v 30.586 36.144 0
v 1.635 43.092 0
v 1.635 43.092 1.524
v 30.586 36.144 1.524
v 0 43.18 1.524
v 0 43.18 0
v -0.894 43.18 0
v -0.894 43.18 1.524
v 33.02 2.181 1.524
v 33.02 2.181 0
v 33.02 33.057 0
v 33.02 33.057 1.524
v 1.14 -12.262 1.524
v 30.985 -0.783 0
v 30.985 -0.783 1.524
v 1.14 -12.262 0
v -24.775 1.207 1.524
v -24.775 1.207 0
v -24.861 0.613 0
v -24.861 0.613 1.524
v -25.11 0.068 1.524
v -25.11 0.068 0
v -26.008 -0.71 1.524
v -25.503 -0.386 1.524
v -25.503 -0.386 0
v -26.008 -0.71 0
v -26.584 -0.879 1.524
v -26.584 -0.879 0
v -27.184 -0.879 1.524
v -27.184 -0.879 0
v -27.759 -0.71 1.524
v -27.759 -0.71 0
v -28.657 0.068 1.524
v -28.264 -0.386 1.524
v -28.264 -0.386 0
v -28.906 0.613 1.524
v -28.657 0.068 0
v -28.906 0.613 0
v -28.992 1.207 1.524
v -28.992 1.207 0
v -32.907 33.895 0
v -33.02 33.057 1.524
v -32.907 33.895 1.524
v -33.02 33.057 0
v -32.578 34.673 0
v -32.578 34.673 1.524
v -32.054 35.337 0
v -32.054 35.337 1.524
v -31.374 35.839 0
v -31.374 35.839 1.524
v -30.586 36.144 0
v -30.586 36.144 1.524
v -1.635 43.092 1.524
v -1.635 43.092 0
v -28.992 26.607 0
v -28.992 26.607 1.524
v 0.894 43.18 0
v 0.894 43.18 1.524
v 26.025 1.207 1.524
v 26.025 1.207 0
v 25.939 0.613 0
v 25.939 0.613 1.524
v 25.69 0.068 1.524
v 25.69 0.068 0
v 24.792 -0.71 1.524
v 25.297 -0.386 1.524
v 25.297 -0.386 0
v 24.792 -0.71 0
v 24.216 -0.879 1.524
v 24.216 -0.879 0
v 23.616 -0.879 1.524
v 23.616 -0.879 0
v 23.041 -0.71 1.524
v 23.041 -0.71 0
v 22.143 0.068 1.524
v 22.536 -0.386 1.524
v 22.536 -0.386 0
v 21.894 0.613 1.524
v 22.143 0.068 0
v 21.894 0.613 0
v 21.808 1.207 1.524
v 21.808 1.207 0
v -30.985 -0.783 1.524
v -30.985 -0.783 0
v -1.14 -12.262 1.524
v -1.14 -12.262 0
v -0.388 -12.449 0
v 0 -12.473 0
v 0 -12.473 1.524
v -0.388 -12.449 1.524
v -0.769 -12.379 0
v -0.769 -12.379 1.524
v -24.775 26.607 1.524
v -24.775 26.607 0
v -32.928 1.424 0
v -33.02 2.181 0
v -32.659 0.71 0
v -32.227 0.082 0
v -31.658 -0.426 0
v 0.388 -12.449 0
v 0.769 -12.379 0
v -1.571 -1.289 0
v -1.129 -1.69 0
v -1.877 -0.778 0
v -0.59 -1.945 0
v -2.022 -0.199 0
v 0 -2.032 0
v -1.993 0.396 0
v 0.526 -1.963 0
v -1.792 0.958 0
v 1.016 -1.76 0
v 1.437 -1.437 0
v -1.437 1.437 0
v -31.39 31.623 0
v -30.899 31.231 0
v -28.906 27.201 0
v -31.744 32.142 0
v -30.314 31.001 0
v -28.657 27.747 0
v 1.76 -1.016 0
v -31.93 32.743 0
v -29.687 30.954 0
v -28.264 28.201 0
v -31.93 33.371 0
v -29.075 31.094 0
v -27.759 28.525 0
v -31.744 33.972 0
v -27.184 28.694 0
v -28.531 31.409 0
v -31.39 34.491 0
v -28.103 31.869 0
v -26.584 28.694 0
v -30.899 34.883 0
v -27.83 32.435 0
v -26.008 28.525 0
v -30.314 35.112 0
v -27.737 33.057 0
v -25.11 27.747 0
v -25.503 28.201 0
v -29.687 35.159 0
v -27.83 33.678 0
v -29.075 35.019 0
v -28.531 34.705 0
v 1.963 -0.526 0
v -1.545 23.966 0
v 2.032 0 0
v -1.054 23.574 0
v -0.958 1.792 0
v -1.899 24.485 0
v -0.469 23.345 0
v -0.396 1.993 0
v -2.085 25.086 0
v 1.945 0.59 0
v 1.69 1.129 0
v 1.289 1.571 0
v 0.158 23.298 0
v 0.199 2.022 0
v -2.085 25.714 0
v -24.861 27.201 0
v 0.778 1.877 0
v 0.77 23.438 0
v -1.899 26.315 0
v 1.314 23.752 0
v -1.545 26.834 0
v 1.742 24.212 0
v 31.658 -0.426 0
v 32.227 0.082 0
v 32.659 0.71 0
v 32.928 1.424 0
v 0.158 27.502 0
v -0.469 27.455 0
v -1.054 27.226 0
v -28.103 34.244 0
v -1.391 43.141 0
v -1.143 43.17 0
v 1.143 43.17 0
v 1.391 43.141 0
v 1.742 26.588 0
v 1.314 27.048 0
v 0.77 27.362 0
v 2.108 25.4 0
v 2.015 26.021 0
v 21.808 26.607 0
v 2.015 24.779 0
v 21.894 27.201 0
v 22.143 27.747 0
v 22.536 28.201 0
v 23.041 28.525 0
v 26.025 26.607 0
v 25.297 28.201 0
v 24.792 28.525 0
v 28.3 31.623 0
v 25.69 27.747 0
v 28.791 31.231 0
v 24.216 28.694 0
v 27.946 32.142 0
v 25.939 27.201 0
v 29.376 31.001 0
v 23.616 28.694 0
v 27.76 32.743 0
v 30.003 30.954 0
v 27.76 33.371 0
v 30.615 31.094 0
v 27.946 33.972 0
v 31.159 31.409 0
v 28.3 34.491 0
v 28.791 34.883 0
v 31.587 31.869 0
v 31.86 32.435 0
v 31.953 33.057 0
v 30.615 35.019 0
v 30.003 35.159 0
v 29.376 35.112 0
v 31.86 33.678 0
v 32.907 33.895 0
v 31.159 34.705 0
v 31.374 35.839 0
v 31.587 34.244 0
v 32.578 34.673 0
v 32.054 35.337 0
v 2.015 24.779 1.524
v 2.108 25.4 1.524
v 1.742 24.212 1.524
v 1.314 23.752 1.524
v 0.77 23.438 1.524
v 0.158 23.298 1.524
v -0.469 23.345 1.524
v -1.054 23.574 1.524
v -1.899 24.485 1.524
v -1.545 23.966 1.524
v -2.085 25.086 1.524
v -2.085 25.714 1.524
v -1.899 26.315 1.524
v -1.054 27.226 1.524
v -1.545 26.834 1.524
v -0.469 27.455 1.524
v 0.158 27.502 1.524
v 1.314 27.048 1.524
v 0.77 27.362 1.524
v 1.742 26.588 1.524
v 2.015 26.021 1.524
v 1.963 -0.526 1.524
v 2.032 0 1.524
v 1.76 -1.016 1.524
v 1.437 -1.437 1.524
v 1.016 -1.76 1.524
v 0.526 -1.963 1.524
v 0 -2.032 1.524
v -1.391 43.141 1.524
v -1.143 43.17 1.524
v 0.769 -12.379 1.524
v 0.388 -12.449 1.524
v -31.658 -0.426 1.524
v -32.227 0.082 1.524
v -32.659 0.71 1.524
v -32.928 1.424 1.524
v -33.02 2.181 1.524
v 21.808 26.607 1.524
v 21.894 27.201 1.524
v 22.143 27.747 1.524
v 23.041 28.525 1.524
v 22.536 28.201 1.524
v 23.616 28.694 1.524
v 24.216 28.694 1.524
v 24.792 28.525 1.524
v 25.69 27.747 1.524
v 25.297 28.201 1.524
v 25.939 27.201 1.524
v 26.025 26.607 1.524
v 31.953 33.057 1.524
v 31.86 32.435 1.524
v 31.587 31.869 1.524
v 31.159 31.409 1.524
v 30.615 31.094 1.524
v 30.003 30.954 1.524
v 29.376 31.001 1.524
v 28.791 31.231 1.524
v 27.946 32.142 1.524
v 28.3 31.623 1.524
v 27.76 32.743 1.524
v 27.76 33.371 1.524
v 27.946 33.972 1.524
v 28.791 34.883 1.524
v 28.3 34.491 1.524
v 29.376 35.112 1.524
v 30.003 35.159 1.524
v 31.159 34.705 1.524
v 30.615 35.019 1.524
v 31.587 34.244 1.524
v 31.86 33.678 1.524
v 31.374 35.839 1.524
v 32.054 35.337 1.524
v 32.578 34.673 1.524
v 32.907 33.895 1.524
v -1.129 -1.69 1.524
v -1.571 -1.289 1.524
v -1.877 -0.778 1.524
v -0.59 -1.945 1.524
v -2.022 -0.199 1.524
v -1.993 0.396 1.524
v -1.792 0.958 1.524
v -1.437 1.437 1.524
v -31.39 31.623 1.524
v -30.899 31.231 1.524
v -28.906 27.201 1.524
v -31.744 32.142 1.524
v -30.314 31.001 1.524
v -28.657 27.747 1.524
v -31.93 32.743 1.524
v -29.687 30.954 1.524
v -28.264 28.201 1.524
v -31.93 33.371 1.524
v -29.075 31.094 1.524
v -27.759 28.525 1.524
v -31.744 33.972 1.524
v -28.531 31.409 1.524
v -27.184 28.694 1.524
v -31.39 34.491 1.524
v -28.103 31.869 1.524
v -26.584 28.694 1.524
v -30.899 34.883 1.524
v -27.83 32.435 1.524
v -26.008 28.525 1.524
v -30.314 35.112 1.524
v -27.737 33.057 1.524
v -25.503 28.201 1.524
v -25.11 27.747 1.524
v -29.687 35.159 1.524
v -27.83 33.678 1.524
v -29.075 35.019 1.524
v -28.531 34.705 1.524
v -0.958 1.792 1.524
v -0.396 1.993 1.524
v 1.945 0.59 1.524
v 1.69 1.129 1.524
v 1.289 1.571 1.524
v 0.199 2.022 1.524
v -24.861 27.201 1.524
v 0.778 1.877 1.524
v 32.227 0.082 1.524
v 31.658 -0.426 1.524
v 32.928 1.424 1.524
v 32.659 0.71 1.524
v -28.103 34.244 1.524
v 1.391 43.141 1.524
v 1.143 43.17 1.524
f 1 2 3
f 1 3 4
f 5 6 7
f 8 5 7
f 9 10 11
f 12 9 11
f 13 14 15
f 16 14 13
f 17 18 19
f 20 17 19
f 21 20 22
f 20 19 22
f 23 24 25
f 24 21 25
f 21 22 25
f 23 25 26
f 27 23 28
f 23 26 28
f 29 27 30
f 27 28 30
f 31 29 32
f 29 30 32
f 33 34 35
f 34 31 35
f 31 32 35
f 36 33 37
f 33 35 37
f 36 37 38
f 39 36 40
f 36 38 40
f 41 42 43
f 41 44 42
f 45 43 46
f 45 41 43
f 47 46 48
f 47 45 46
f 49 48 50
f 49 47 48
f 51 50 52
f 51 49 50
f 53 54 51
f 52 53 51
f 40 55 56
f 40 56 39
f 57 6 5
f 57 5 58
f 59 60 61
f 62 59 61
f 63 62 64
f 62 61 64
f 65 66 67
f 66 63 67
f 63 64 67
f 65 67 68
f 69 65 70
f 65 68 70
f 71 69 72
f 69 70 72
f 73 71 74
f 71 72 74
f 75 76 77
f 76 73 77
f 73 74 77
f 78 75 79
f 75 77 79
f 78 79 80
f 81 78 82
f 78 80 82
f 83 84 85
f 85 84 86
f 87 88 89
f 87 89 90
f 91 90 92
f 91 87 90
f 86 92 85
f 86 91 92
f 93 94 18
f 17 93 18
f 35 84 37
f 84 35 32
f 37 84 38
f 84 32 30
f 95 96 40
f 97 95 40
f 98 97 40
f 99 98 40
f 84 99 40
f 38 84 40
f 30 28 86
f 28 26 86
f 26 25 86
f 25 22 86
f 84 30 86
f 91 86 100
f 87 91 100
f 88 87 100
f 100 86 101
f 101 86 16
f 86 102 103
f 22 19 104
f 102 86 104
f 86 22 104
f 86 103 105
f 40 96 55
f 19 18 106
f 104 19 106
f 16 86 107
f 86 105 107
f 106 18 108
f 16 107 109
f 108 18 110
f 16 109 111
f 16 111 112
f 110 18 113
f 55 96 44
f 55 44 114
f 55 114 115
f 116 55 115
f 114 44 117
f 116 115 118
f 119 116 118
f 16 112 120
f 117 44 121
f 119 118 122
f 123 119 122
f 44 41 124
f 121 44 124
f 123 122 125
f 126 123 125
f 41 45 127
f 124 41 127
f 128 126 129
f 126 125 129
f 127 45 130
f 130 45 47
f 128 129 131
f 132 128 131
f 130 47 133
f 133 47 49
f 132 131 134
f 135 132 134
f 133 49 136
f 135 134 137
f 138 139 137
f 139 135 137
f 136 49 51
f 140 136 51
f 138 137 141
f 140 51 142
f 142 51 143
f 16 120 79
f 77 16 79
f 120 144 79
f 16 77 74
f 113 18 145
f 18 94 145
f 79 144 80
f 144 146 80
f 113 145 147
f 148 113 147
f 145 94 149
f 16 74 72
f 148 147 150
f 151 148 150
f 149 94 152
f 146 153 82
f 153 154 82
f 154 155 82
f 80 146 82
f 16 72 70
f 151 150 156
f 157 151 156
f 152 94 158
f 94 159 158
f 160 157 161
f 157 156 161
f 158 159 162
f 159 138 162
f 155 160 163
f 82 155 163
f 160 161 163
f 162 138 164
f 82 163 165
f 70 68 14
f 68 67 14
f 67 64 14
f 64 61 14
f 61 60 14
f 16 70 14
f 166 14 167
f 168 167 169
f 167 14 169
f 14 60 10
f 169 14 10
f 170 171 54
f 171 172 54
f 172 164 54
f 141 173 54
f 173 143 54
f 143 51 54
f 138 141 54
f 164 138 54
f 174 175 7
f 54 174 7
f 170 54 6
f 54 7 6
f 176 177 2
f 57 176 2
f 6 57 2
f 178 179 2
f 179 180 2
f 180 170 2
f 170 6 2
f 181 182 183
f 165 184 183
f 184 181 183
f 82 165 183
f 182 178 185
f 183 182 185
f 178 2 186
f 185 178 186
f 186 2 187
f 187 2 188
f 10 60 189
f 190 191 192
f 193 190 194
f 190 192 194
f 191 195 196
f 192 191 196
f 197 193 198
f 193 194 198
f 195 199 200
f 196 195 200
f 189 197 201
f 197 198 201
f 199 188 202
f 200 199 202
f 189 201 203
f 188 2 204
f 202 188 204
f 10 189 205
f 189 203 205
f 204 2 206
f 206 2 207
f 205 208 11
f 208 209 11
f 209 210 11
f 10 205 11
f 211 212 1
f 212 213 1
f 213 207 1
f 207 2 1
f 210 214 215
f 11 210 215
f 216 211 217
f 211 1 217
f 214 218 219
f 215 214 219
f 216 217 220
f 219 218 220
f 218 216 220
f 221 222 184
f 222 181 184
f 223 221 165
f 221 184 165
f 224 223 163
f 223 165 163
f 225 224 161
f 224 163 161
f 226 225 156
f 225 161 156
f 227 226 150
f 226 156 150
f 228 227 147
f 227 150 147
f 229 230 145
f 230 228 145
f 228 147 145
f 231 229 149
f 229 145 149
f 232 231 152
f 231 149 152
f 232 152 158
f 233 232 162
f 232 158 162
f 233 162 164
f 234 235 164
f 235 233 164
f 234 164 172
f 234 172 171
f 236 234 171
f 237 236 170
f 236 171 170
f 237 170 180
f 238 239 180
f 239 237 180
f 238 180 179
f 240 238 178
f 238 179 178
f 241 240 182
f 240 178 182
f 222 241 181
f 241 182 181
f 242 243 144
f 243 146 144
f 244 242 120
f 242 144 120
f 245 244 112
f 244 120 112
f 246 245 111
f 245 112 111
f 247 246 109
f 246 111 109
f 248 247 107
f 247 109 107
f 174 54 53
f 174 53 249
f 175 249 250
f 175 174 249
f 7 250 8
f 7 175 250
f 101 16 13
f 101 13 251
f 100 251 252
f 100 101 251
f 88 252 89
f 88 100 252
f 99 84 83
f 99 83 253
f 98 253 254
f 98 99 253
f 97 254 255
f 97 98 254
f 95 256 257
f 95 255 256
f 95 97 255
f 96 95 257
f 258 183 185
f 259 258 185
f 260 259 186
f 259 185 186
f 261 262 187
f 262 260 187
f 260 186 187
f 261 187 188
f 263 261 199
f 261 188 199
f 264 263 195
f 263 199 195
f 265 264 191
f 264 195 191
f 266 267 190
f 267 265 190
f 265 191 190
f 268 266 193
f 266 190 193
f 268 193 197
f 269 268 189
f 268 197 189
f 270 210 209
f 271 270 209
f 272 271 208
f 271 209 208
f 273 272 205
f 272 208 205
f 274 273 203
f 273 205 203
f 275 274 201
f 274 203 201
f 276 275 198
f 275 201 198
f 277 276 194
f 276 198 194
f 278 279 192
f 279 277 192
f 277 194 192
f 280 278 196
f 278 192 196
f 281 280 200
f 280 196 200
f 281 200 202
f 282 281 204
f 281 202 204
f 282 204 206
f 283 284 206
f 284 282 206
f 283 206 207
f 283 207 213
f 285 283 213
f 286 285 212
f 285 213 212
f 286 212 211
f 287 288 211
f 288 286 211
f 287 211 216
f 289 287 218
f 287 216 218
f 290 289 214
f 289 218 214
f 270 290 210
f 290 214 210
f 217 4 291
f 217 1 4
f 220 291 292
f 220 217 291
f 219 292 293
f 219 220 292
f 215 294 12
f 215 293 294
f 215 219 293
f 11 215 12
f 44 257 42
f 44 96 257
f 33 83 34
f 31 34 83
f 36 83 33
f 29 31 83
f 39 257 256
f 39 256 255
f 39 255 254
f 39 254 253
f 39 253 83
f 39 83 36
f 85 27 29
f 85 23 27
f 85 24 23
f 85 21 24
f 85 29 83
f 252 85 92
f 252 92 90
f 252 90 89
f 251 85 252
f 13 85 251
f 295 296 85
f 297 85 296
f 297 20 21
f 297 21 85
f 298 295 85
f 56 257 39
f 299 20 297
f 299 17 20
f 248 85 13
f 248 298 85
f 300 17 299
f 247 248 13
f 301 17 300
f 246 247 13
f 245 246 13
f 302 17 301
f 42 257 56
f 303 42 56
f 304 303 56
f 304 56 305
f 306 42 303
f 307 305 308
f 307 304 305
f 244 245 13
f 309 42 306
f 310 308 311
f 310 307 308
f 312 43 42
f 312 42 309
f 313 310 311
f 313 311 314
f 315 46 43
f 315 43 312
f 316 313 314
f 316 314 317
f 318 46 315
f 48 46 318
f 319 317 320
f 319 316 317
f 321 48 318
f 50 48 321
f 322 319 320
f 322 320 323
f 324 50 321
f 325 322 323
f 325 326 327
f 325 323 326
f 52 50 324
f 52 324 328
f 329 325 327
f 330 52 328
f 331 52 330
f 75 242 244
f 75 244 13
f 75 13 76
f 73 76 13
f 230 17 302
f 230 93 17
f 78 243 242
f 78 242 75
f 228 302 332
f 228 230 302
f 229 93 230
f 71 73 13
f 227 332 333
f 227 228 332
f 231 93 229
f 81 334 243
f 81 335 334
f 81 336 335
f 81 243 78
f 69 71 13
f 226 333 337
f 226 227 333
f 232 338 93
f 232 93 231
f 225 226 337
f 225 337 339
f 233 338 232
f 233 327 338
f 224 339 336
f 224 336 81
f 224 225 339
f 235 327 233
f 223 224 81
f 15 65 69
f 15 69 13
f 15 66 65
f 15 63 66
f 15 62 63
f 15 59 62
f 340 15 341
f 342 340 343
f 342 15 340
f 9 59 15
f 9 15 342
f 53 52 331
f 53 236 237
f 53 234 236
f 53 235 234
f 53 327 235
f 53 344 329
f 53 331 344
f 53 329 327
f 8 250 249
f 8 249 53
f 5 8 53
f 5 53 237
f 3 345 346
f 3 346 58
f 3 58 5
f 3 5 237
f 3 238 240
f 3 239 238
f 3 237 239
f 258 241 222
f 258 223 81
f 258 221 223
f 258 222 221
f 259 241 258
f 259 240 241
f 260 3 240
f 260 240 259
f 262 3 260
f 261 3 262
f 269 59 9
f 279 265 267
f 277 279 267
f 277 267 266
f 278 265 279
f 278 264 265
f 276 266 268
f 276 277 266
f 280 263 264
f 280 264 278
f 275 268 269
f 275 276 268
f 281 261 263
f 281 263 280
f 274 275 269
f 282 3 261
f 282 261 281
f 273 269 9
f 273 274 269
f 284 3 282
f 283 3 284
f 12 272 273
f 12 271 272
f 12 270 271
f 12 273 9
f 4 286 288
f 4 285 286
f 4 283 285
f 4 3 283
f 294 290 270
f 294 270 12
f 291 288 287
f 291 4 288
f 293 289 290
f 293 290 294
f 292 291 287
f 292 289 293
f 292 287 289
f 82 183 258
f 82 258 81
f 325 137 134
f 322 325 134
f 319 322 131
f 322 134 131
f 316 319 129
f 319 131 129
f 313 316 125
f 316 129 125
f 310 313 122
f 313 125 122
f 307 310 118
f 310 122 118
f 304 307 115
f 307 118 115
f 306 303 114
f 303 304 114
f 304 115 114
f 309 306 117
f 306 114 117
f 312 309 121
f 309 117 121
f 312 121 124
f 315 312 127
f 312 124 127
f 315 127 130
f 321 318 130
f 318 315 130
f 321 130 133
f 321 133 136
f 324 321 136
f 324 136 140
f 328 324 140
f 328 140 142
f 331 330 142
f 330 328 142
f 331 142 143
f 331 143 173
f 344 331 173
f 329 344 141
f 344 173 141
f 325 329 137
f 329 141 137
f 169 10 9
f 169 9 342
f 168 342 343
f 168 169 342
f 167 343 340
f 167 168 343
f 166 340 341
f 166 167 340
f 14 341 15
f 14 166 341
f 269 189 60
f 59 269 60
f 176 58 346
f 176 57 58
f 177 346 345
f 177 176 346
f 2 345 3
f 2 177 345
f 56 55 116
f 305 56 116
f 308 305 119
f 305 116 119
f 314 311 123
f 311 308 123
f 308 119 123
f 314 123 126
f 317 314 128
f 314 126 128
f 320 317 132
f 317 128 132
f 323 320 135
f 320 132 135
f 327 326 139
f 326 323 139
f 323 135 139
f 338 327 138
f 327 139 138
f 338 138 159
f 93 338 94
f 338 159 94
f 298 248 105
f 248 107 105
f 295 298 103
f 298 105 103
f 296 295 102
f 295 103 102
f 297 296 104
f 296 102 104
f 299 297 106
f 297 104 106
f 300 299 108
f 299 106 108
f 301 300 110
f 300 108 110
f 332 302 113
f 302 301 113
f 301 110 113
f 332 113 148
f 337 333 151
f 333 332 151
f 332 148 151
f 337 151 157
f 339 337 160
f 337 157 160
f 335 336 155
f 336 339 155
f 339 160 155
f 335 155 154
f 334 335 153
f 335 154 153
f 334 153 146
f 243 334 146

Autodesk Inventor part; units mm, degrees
ref_plane "YZ Plane" through (0, 0, 0) normal (1, 0, 0) x (0, 1, 0)
ref_plane "XZ Plane" through (0, 0, 0) normal (0, 1, 0) x (-1, 0, 0)
ref_plane "XY Plane" through (0, 0, 0) normal (0, 0, 1) x (1, 0, 0)
sketch "Sketch1" plane through (0, 0, 0) normal (0, 0, 1) x (1, 0, 0)
  circle A0 centre (0, 0) radius 2.032 projected
  circle A1 centre (0, 25.4) radius 2.1082
  line L0 (26.0246, 26.6073) -> (26.0246, 1.2073)
  line L1 (21.8082, 26.6073) -> (21.8082, 1.2073)
  arc A2 (26.0246, 26.6073) -> (21.8082, 26.6073) centre (23.9164, 26.6073) ccw
  arc A3 (21.8082, 1.2073) -> (26.0246, 1.2073) centre (23.9164, 1.2073) ccw
  line L2 (-33.02, 2.1806) -> (-33.02, 33.0568)
  line L3 (33.02, 2.1806) -> (33.02, 33.0568)
  line L4 (0, 43.18) -> (0.8943, 43.18)
  line L5 (0, 43.18) -> (-0.8943, 43.18)
  line L6 (1.6353, 43.0923) -> (30.586, 36.1442)
  line L7 (-1.6353, 43.0923) -> (-30.586, 36.1442)
  line L8 (0, 0) -> (0, -12.7)
  line L9 (-30.9848, -0.7828) -> (-1.1398, -12.2616)
  line L10 (30.9848, -0.7828) -> (1.1398, -12.2616)
  arc A4 (-30.586, 36.1442) -> (-33.02, 33.0568) centre (-29.845, 33.0568) ccw
  arc A5 (-0.8943, 43.18) -> (-1.6353, 43.0923) centre (-0.8943, 40.005) ccw
  arc A6 (1.6353, 43.0923) -> (0.8943, 43.18) centre (0.8943, 40.005) ccw
  arc A7 (33.02, 33.0568) -> (30.586, 36.1442) centre (29.845, 33.0568) ccw
  arc A8 (30.9848, -0.7828) -> (33.02, 2.1806) centre (29.845, 2.1806) ccw
  arc A9 (-1.1398, -12.2616) -> (1.1398, -12.2616) centre (0, -9.2983) ccw
  arc A10 (-33.02, 2.1806) -> (-30.9848, -0.7828) centre (-29.845, 2.1806) ccw
  line L11 (-24.7754, 26.6073) -> (-24.7754, 1.2073)
  line L12 (-28.9918, 26.6073) -> (-28.9918, 1.2073)
  arc A11 (-24.7754, 26.6073) -> (-28.9918, 26.6073) centre (-26.8836, 26.6073) ccw
  arc A12 (-28.9918, 1.2073) -> (-24.7754, 1.2073) centre (-26.8836, 1.2073) ccw
  circle A13 centre (-29.845, 33.0568) radius 2.1082
  circle A14 centre (29.845, 33.0568) radius 2.1082
  point P0 (0, 0)
  point P1 (-33.02, 0)
  point P2 (33.02, 0)
  point P3 (-33.02, 35.56)
  point P4 (1.27, 43.18)
  point P5 (-1.27, 43.18)
  dimension "d1" = 4.2164
  dimension "d10" = 33.02
  dimension "d11" = 33.02
  dimension "d12" = 43.18
  dimension "d13" = 35.56
  dimension "d14" = 1.27
  dimension "d15" = 1.27
  dimension "d16" = 12.7
  dimension "d17" = 3.175
  dimension "d37" = 2.1082
  dimension "d38" = 25.4
  dimension "d39" = 4.2164
  dimension "d41" = 2.1082
  dimension "d43" = 4.2164
  dimension "d44" = 4.2164
  dimension "d45" = 4.2164
extrude "Extrusion3" add sketch "Sketch1" along normal blind 1.524
equation "\"d1\" = d43"
equation "\"d39\" = 2 * d37"
equation "\"d41\" = d37"
equation "\"d43\" = d39"
